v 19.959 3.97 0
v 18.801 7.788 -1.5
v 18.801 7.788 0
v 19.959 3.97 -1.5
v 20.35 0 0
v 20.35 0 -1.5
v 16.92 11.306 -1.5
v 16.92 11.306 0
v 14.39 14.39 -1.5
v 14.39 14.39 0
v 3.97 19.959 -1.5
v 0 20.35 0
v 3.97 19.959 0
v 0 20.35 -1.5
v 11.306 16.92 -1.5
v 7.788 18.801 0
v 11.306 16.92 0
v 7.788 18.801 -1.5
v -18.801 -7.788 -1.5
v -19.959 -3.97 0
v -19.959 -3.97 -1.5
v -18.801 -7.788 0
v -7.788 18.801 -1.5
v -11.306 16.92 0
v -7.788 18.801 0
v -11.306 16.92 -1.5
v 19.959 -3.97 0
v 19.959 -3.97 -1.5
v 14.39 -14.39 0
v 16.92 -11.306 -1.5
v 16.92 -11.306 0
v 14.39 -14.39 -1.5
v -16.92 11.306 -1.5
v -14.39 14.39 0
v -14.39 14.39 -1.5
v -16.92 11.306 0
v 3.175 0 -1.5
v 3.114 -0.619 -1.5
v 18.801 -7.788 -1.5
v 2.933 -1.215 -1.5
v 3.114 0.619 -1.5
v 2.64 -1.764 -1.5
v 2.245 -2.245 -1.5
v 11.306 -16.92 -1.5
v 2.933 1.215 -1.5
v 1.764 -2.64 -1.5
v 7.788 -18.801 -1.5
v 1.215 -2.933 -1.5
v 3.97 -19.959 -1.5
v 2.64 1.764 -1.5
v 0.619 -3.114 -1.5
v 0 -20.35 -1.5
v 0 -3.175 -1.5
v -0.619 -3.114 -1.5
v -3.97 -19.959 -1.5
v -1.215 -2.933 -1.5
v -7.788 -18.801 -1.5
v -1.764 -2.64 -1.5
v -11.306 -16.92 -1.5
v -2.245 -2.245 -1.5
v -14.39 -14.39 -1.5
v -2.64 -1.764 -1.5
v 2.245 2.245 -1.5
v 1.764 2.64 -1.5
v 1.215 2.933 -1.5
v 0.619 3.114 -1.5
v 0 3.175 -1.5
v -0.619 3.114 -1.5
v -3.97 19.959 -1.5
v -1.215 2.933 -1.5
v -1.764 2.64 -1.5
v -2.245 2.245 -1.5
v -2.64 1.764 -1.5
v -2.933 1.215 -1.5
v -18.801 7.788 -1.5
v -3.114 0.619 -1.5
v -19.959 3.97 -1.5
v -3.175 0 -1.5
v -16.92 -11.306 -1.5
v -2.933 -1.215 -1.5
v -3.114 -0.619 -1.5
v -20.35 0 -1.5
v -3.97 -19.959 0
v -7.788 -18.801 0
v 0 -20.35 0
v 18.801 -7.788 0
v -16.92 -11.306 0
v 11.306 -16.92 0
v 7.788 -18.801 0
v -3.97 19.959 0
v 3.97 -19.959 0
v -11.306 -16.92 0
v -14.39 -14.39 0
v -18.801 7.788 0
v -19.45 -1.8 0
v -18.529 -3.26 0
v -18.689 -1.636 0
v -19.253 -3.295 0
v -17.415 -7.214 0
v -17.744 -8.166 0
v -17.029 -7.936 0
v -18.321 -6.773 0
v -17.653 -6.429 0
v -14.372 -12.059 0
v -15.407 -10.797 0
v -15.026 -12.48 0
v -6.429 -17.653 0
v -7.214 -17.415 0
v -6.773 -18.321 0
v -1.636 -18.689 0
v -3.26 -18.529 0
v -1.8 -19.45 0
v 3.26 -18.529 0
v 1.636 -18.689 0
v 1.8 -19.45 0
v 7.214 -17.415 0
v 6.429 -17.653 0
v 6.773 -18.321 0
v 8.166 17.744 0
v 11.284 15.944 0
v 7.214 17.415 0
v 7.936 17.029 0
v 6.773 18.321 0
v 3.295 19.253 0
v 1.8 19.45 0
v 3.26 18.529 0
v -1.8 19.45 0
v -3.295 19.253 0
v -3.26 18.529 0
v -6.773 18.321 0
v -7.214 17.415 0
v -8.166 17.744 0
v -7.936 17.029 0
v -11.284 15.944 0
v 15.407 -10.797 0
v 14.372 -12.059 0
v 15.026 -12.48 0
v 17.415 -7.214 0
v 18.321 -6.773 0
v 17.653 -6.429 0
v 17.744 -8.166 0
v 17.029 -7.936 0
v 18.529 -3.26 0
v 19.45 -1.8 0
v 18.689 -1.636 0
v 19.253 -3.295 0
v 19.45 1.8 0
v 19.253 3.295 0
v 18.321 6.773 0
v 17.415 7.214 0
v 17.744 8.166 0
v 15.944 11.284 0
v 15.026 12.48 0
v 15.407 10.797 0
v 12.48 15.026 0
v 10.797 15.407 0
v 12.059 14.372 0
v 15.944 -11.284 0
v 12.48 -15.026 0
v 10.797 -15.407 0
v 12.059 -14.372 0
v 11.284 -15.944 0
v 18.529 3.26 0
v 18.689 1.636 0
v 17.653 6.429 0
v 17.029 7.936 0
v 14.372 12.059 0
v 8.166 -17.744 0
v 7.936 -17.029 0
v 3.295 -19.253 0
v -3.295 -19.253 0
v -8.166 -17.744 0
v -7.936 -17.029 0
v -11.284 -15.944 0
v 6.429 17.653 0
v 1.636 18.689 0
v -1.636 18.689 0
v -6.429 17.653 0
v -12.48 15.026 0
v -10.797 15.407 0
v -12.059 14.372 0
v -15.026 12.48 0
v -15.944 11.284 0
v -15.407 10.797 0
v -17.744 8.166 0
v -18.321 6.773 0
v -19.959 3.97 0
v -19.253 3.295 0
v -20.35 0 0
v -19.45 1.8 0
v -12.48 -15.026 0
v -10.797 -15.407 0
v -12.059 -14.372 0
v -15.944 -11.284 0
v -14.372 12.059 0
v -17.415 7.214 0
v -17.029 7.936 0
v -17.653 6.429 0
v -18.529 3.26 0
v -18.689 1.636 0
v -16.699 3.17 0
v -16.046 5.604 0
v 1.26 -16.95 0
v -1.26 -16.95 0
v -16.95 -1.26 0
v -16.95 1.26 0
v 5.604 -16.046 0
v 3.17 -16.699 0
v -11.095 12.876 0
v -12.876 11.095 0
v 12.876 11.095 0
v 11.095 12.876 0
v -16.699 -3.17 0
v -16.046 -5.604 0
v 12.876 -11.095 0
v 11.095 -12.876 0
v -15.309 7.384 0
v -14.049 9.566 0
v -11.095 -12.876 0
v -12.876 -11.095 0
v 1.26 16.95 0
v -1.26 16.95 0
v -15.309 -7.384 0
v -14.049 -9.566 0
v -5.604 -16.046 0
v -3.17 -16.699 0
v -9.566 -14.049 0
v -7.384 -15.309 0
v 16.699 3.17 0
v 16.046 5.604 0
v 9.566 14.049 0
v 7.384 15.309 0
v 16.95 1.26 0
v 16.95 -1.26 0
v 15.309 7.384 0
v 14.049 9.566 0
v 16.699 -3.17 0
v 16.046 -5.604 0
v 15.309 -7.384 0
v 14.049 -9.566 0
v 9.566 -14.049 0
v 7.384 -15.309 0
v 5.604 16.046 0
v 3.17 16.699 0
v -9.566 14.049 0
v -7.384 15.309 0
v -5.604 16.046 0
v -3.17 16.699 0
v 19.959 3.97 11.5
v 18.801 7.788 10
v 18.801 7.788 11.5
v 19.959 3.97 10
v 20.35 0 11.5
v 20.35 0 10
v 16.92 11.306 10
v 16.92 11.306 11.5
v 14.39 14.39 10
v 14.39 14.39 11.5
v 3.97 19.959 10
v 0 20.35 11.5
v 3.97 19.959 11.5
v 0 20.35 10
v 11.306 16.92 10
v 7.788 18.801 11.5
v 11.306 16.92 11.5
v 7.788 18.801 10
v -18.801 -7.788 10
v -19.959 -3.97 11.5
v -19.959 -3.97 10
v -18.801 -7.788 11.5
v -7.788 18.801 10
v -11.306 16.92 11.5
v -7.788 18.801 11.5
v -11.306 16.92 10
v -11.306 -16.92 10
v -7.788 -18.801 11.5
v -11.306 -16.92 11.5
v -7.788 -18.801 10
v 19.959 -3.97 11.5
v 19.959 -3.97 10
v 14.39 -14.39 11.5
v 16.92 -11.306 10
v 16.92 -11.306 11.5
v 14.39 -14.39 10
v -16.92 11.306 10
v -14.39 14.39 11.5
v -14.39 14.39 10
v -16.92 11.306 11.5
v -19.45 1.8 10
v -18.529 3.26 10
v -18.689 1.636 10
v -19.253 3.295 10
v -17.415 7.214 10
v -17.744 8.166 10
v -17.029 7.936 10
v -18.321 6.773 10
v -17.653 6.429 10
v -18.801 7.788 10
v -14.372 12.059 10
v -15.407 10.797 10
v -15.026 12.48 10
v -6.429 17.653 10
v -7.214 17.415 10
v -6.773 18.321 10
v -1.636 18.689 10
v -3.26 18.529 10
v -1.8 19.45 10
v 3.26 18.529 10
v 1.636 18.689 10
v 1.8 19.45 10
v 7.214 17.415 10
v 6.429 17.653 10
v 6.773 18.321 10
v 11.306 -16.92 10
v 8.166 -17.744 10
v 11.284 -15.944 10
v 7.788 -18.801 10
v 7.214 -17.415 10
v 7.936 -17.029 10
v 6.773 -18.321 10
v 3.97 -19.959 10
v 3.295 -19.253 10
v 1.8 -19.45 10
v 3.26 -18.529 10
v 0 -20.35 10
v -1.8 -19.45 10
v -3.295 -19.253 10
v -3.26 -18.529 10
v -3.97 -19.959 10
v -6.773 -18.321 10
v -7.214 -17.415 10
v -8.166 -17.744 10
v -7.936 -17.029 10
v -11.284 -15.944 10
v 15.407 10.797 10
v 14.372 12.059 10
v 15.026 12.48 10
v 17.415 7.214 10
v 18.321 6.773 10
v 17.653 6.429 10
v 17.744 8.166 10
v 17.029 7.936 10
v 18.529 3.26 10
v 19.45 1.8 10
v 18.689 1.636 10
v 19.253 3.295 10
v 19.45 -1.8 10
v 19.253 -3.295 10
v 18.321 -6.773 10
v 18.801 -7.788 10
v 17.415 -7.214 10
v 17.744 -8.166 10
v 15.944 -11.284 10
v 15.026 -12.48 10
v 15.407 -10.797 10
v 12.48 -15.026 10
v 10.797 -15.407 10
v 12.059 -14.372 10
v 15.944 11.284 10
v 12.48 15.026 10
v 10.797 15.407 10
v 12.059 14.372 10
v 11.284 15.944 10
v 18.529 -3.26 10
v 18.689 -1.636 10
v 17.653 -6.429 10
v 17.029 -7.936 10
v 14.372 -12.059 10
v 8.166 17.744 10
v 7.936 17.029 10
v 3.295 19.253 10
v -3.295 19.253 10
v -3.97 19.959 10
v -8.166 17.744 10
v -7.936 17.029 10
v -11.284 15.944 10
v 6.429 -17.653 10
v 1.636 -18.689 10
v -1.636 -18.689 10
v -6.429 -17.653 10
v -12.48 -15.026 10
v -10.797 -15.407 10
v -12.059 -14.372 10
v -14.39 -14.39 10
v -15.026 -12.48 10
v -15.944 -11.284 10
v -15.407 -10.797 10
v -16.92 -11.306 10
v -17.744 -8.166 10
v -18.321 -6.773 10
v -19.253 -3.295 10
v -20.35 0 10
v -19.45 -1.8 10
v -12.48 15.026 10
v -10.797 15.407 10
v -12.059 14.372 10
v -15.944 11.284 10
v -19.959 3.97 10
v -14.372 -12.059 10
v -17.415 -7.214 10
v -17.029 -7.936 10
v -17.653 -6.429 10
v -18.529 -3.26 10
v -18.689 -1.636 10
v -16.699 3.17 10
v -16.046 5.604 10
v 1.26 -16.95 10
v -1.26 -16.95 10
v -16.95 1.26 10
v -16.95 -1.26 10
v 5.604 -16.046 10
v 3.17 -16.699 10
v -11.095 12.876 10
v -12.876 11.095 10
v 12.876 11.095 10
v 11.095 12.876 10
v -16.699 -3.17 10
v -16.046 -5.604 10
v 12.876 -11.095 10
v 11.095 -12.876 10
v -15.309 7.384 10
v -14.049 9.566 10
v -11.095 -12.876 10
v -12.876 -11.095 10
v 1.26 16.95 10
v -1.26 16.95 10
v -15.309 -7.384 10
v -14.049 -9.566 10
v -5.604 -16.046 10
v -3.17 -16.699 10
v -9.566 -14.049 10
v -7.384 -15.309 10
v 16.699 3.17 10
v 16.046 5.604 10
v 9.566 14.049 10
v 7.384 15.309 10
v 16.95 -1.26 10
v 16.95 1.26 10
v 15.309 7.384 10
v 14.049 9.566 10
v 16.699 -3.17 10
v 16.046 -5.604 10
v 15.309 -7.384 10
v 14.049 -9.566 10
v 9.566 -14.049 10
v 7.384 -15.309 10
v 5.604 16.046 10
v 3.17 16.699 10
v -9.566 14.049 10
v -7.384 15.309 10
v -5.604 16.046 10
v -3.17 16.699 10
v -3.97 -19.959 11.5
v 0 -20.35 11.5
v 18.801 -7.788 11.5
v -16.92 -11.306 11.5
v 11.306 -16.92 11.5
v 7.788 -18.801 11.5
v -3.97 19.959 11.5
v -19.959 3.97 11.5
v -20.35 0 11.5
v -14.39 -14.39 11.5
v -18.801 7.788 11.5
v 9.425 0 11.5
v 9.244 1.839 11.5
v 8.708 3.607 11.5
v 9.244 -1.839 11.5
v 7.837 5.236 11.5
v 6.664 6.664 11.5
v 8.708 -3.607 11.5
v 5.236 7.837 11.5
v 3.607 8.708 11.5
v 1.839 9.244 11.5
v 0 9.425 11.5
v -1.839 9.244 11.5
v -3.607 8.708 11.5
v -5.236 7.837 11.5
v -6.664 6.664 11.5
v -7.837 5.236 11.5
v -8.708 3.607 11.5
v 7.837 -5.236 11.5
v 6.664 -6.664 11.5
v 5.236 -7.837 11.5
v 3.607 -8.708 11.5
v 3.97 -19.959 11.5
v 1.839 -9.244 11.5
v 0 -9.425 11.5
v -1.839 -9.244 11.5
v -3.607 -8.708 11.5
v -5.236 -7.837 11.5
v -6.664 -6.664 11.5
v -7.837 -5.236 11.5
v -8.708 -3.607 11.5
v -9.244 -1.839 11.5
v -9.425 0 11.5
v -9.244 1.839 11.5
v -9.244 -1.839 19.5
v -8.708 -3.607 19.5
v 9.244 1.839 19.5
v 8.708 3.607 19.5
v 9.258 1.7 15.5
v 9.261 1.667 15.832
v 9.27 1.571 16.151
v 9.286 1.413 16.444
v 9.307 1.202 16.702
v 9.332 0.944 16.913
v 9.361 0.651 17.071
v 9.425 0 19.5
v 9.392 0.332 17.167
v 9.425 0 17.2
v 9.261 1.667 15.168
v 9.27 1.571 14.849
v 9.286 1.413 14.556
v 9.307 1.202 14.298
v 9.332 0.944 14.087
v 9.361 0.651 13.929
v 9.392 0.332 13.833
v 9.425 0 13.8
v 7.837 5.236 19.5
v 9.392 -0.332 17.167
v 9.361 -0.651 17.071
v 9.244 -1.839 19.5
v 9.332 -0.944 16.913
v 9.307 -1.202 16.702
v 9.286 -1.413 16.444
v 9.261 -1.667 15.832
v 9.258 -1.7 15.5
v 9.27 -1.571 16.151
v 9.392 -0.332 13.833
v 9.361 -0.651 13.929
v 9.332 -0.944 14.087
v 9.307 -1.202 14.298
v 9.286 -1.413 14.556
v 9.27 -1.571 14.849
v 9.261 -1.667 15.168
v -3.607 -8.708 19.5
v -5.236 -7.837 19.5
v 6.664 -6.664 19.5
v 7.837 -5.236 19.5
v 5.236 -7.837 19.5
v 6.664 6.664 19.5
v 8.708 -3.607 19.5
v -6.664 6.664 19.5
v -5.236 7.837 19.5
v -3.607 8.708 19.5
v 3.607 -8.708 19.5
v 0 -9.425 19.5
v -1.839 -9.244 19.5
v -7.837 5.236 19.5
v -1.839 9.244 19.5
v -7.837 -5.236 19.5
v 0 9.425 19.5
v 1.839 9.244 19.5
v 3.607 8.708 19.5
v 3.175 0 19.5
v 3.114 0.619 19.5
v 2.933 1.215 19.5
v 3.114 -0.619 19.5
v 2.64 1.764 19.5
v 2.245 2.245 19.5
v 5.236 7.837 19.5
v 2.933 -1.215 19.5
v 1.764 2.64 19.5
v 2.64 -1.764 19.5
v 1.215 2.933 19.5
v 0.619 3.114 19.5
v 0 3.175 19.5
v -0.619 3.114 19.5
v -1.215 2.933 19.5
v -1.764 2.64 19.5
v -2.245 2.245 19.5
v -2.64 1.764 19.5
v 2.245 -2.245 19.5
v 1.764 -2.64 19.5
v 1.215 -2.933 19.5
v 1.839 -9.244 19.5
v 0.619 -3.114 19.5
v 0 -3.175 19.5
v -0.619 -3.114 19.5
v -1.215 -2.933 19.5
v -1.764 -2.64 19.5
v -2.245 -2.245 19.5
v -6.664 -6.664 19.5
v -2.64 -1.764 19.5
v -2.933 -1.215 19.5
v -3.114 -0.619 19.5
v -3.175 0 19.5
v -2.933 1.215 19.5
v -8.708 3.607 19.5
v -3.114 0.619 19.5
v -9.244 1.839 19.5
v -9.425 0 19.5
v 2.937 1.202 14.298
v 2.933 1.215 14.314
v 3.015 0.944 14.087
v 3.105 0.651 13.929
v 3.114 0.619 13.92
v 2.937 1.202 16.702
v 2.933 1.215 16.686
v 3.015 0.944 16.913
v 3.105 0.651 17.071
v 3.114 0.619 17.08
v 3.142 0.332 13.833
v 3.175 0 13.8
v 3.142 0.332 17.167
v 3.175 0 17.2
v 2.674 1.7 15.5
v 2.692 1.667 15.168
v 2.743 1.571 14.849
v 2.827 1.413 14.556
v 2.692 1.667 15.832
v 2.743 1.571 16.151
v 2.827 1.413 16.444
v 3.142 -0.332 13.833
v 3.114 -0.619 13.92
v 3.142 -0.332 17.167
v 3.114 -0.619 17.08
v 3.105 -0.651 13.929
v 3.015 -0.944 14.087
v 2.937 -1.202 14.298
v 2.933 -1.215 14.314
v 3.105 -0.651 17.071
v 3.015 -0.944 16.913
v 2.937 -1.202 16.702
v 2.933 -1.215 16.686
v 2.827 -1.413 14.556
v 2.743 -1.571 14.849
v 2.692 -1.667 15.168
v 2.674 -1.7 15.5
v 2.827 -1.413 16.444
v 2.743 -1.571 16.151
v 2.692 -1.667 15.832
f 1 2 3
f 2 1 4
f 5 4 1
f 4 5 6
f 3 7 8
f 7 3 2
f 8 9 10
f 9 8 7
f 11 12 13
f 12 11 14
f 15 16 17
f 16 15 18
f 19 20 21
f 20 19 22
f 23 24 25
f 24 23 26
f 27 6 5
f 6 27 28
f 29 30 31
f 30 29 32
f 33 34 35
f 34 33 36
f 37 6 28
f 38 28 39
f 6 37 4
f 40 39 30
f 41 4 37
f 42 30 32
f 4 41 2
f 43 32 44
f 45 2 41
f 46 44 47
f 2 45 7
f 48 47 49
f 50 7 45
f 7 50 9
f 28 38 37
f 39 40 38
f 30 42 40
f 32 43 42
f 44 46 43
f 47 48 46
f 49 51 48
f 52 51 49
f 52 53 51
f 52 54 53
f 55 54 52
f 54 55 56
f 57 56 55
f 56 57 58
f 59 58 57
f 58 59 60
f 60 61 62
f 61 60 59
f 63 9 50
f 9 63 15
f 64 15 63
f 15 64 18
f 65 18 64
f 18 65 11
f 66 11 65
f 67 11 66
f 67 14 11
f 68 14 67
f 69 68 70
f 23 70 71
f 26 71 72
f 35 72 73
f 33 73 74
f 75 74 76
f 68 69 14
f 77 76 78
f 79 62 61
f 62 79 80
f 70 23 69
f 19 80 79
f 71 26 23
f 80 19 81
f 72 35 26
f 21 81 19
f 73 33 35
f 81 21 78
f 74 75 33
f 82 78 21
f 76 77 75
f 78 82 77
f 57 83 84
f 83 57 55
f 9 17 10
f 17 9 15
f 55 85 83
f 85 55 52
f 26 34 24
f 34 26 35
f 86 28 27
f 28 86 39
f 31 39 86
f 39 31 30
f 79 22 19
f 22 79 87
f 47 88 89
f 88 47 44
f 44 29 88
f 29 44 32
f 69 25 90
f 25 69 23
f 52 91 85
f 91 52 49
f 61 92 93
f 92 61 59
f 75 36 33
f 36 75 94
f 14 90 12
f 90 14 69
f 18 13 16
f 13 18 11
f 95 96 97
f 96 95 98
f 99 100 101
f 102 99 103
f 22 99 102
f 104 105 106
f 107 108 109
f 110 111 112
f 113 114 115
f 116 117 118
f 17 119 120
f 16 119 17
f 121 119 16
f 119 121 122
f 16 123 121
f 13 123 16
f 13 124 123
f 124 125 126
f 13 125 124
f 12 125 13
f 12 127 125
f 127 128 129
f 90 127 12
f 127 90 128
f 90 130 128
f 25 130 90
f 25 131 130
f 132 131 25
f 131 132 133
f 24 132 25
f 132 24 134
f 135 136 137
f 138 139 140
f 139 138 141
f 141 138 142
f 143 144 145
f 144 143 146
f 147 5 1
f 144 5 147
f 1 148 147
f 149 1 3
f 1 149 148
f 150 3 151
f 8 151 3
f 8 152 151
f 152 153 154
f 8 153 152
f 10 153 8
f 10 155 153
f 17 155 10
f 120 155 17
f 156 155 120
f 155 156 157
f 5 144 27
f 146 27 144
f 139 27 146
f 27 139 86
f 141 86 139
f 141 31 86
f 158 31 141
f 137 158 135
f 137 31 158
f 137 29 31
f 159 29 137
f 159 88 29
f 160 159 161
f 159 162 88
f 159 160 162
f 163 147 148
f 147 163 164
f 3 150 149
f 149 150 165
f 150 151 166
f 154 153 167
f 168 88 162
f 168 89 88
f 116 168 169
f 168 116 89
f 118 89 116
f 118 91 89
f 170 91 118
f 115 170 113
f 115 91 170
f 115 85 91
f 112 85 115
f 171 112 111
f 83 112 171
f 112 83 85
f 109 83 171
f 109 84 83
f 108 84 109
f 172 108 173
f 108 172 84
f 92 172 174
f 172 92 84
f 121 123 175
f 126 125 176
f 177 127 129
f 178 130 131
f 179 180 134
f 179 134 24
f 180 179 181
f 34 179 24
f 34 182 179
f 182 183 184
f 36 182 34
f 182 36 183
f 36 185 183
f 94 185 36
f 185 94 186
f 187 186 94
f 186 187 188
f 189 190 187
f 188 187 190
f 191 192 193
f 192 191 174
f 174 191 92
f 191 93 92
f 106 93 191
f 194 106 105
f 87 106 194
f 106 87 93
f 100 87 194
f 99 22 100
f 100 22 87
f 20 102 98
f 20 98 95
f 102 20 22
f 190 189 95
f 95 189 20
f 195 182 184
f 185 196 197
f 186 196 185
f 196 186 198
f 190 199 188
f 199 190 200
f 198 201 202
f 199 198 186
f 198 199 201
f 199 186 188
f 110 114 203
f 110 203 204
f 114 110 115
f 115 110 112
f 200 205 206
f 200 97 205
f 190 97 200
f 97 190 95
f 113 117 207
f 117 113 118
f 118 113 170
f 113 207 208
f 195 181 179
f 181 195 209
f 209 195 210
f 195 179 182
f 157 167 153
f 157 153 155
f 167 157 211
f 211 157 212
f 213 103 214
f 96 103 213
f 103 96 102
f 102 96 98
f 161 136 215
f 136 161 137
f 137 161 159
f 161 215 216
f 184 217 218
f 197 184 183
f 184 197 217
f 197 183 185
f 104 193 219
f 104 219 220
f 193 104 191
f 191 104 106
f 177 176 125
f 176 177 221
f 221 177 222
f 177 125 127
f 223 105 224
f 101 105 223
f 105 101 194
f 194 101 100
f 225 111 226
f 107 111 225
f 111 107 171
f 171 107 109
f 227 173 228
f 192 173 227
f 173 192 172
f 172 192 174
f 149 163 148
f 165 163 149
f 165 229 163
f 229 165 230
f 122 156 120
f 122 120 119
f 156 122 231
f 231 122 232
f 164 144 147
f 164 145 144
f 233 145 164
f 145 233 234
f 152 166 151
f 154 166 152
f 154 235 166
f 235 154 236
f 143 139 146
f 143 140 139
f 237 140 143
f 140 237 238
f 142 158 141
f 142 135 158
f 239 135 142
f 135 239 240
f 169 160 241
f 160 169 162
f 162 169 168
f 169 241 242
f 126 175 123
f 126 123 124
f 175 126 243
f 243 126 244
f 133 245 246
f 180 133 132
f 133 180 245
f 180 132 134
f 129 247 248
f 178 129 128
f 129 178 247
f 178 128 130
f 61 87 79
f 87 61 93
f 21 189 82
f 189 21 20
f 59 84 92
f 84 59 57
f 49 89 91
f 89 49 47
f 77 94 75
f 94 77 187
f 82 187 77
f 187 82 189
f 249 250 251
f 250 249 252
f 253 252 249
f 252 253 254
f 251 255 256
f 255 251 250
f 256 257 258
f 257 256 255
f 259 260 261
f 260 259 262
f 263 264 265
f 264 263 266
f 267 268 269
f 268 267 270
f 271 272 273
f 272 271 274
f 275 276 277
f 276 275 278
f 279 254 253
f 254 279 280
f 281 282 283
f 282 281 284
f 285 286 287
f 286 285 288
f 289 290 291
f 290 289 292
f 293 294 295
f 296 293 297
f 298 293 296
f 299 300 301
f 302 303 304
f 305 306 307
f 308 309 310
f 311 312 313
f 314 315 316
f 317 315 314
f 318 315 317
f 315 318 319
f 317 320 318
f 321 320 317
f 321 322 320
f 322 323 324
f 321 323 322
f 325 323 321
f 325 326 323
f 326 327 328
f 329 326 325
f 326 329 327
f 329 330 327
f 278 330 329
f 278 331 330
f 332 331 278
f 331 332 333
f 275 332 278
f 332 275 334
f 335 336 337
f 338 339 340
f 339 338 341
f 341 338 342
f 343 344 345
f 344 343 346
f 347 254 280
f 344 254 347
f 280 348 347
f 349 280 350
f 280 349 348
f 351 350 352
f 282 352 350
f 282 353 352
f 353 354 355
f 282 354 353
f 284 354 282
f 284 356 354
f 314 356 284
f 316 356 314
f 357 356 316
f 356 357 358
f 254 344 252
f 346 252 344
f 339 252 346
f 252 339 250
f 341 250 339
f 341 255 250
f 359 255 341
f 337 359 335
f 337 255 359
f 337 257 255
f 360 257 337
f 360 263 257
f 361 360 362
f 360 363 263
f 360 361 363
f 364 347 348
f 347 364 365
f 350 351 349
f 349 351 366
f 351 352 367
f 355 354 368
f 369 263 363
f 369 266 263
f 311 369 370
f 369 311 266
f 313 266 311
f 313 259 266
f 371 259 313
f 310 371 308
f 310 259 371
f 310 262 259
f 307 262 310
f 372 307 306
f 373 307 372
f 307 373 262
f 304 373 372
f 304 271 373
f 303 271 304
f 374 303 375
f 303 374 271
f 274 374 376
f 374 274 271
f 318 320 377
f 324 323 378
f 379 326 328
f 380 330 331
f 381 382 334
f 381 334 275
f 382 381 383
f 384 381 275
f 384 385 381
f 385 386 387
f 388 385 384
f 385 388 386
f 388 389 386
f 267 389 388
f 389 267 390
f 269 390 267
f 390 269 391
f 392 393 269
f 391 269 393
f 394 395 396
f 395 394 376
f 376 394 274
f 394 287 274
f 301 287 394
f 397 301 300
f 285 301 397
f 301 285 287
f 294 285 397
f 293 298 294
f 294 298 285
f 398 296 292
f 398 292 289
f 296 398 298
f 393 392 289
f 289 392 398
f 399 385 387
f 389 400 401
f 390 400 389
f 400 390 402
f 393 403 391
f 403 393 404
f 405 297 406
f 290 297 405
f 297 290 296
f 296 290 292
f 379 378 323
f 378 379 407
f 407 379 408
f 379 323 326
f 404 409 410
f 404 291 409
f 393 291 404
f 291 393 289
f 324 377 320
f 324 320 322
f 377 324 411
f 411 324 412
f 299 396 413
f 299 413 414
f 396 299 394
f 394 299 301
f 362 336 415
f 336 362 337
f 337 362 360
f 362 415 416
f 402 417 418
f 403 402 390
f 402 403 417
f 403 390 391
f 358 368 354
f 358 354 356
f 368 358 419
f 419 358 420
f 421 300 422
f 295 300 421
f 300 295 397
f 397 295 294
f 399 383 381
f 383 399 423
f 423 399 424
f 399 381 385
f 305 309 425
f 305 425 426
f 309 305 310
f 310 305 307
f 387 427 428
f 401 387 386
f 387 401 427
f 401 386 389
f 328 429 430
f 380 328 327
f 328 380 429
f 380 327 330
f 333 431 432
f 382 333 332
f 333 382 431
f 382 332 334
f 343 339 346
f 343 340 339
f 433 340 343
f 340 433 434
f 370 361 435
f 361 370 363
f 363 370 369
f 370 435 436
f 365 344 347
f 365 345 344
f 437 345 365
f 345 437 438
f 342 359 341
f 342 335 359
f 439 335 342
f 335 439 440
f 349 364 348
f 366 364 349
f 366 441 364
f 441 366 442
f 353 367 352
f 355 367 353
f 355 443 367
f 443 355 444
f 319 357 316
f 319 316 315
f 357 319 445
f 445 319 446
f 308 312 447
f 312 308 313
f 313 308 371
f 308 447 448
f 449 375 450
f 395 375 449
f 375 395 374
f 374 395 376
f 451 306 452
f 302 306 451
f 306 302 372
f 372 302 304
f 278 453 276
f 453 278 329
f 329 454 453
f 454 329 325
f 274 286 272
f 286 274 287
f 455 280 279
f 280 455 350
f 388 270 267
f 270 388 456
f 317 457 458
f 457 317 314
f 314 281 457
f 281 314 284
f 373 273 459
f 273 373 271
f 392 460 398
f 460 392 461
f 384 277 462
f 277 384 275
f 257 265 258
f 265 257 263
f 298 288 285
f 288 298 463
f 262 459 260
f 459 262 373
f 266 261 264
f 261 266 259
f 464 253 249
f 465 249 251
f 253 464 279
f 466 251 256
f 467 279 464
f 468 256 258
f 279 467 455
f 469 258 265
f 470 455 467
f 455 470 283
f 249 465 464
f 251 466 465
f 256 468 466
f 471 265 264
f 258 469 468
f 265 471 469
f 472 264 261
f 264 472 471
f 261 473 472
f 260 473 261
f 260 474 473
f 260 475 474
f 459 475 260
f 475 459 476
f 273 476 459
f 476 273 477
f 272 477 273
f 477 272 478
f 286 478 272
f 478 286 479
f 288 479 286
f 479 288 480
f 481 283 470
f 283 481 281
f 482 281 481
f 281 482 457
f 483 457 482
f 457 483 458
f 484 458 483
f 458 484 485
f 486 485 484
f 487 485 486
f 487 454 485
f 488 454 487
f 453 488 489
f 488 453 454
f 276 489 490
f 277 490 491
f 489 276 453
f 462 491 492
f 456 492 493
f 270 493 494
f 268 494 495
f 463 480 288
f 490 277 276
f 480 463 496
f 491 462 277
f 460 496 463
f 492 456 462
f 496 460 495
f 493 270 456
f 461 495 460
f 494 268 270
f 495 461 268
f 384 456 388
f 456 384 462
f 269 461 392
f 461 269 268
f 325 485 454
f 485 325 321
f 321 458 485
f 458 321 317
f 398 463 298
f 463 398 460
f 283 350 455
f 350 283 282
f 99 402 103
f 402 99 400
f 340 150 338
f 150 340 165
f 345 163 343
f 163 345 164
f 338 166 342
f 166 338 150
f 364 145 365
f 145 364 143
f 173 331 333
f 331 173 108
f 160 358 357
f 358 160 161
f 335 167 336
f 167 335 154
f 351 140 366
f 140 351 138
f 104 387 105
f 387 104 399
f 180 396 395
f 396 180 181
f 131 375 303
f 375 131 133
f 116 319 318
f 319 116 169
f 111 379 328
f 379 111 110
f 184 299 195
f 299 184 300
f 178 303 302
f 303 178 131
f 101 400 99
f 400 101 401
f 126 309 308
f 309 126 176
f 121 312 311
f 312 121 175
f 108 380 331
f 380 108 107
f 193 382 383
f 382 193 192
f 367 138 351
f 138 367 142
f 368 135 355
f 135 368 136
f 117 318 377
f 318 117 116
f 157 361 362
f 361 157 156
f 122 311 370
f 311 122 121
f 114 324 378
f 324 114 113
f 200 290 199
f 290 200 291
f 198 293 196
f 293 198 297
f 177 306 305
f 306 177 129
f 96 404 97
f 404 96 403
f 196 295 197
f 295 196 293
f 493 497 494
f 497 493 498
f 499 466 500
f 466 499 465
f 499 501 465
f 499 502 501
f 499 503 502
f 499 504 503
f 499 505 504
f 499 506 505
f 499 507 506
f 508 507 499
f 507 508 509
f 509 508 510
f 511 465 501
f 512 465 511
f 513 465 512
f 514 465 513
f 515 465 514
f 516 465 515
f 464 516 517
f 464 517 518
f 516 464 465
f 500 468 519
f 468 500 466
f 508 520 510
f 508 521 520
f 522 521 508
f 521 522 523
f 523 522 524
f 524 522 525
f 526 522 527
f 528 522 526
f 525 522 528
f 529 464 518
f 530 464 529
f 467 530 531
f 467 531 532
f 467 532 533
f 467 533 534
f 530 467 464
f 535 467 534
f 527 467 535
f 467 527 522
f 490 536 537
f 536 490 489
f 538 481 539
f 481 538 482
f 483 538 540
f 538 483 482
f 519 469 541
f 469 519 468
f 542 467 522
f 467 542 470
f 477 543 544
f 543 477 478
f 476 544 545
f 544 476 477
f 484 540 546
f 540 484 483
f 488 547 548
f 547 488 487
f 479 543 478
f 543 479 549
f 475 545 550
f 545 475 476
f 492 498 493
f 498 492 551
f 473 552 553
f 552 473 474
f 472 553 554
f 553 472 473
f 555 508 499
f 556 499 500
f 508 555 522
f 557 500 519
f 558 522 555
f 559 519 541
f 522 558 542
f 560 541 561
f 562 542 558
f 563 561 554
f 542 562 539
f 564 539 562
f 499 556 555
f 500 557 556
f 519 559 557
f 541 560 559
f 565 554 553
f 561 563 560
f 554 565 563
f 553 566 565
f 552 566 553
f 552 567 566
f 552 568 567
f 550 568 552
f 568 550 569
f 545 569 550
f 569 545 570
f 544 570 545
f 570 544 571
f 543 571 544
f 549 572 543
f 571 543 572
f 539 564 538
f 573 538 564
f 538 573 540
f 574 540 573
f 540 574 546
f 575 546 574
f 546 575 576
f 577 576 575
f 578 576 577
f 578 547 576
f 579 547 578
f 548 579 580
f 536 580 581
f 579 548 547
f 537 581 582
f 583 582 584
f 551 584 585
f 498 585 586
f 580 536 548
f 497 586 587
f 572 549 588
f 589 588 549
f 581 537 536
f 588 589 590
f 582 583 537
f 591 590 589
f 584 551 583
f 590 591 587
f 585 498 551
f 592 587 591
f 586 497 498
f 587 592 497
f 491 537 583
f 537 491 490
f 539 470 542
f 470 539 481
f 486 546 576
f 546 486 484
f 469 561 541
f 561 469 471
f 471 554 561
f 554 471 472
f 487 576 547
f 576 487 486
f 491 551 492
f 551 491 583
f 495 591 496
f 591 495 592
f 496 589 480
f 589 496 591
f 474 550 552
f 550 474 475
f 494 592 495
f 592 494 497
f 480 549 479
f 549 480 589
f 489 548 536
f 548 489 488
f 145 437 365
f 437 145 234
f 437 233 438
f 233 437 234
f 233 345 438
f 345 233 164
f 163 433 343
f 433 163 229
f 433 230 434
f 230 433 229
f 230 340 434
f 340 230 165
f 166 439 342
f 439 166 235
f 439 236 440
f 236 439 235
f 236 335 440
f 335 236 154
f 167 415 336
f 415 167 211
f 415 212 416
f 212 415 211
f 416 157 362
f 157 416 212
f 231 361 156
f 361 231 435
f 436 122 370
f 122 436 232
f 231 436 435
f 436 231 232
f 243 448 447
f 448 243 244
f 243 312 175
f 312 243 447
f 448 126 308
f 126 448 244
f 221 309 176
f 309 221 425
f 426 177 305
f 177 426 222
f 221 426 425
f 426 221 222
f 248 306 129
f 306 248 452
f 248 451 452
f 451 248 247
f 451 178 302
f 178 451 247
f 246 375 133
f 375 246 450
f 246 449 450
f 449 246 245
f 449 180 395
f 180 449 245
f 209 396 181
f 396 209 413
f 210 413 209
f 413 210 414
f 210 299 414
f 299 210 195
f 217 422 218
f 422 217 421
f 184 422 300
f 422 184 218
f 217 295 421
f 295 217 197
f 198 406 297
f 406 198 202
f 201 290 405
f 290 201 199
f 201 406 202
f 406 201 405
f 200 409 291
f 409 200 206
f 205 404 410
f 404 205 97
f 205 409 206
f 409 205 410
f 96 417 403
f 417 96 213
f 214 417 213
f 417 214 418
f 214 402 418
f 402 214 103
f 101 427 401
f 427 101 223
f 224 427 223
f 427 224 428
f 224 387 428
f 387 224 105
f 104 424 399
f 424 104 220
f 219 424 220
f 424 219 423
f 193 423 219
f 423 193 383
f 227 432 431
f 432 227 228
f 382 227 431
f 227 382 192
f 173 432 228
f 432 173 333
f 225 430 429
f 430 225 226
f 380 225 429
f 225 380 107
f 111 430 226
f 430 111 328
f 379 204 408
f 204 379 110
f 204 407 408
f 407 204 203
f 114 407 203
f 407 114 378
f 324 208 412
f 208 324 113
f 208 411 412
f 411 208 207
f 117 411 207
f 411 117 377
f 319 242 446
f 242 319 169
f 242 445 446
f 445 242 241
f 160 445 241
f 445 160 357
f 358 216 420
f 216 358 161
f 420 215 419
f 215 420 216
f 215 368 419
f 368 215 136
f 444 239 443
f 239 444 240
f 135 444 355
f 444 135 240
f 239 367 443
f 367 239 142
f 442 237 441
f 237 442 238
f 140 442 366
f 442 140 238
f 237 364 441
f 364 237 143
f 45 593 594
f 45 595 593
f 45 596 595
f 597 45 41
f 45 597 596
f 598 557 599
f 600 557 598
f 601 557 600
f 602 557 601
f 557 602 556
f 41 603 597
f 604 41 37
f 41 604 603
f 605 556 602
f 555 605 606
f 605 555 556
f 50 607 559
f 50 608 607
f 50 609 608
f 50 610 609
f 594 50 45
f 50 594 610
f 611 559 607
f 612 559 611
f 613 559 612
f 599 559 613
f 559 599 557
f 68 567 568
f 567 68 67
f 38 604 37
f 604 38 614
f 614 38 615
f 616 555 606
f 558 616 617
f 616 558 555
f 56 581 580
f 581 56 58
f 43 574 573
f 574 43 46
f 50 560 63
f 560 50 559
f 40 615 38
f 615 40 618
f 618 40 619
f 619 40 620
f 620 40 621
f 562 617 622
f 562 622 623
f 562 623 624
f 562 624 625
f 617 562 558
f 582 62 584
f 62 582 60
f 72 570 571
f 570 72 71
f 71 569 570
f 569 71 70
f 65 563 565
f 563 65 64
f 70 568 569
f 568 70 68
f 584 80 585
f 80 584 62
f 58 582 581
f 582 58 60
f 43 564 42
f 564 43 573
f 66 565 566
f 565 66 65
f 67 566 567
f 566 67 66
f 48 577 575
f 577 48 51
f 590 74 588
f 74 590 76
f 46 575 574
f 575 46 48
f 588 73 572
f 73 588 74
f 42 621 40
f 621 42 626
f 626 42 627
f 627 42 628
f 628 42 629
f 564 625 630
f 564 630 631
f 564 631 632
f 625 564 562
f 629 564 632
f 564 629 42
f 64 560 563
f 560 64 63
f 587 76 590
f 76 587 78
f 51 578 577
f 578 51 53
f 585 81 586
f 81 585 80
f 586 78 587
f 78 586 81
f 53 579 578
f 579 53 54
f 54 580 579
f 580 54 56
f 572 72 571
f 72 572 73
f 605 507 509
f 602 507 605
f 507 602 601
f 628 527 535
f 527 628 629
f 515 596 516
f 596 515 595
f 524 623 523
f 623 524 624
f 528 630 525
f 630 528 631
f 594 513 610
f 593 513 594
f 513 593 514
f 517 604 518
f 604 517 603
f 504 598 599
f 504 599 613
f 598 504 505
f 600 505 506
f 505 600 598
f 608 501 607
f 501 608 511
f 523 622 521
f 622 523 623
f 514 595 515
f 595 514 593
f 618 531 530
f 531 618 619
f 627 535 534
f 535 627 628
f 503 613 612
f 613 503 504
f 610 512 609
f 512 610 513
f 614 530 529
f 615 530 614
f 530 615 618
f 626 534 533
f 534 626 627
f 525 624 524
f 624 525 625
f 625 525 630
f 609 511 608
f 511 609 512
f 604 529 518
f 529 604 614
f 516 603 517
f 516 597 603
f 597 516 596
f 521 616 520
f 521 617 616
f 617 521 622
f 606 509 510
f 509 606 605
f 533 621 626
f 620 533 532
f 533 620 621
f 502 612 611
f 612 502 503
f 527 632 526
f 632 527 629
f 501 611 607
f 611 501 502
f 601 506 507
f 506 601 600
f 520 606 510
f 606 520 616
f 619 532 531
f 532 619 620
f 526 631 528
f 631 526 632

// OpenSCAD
$fn = 32;

// ----------------------------------------------------------------------
// Timing pulley: T5 24T, pitch 5 mm, 40.7 mm x 21 mm
// ----------------------------------------------------------------------

// --- parameters (mm) ---
pitch_mm = 5;             // belt pitch
tooth_count = 24;         // number of grooves
width = 10;               // belt width between the flanges
tip_d = 37.7;             // tip circle diameter
root_d = 35.1;            // groove bottom diameter
groove_h = 1.3;           // groove depth
tooth_w = 3;              // groove width at the tip circle
side_d = 40.7;            // flange diameter
side_t = 1.5;             // flange thickness
spigot_d = 33.5;          // flange spigot, sunk into the rim
spigot_h = 1.2;           // spigot depth into the rim
hub_bore = 6.35;          // shaft bore
hub_d = 18.85;            // hub diameter
hub_h = 8;                // hub above the flange
bottom_z = -1.5;          // lowest point of the pulley
top_z = 19.5;             // highest point of the pulley
set_d = 3.4;              // set screw tap hole

module rim() {
  cylinder(h = width, d = tip_d);
}

module groove_cutter() {
  /* belt tooth groove: deeper than wide, cut through the belt width */
  translate([root_d / 2, 0, 0])
    linear_extrude(height = width)
      polygon(points = [[-0.6, -tooth_w * 0.42], [groove_h + 0.6, -tooth_w * 0.6],
                        [groove_h + 0.6, tooth_w * 0.6], [-0.6, tooth_w * 0.42]]);
}

module flanges() {
  translate([0, 0, -side_t]) cylinder(h = side_t, d = side_d);
  translate([0, 0, width]) cylinder(h = side_t, d = side_d);
  translate([0, 0, -spigot_h]) cylinder(h = spigot_h + 0.6, d = spigot_d);
  translate([0, 0, width - 0.6]) cylinder(h = spigot_h + 0.6, d = spigot_d);
}

module hub() {
  translate([0, 0, bottom_z]) cylinder(h = top_z - bottom_z, d = hub_d);
}

difference() {
  union() {
    rim();
    hub();
    flanges();
  }
  for (i = [0 : tooth_count - 1]) rotate([0, 0, i * 360 / tooth_count]) groove_cutter();
  translate([0, 0, bottom_z - 1]) cylinder(h = top_z - bottom_z + 2, d = hub_bore);
  translate([-1, 0, top_z - hub_h * 0.5]) rotate([0, 90, 0]) cylinder(h = hub_d / 2 + 3, d = set_d);
}
